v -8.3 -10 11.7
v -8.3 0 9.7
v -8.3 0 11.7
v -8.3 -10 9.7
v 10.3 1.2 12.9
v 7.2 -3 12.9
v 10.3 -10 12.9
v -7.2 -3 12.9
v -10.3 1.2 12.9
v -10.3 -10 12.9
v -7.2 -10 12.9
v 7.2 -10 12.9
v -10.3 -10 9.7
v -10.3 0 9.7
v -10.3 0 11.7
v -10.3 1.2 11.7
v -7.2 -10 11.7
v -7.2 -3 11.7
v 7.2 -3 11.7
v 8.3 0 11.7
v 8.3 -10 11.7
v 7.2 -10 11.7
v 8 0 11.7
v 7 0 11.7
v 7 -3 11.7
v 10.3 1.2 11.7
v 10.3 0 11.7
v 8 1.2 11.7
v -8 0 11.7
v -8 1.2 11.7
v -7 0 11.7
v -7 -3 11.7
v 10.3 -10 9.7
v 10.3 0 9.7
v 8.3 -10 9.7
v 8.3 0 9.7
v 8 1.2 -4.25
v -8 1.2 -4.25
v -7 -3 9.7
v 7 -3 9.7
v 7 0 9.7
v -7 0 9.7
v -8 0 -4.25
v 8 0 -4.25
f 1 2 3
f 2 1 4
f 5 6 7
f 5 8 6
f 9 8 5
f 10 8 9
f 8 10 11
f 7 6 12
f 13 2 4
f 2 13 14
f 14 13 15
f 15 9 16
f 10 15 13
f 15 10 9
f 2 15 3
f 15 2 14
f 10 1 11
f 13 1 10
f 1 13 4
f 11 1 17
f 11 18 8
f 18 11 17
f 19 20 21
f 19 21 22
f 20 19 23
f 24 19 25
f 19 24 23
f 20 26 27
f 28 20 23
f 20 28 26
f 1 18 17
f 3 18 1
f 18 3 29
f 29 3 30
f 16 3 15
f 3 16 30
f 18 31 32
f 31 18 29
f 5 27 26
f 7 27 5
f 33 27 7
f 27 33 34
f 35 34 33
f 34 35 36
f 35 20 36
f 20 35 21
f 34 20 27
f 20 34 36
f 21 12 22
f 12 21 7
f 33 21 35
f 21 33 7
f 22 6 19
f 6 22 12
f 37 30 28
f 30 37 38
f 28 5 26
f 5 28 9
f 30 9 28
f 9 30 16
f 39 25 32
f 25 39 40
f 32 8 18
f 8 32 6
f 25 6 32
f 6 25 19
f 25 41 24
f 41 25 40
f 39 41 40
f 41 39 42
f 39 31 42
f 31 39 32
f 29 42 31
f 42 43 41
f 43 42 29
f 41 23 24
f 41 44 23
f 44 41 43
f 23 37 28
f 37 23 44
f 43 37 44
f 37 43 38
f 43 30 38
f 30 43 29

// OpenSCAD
// ReachSense six-finger wrap v2. Units: mm. Experimental, physically unverified.
// R: +X lateral, +Y distal (towards fingertip), +Z dorsal.
// A REMOVABLE seating gauge defines Y=0. The wearable deck ends at Y=-3.
// Remove the gauge before testing; no permanent wall blocks the fingertip.
// This defines nominal longitudinal registration, NOT an anatomical 3D point.
$fn = 48;
part = "gauge"; // "holder", "gauge" or "strap"
marker_id = 32;
finger_diameter_mm = 17;
marker_edge_mm = 10;
quiet_zone_mm = 2;
frame_mm = 1;
wall_mm = 2;
stop_wall_mm = 1.2;
strap_width_mm = 6;
strap_length_mm = 90;
gauge_side_clearance_mm = 0.3;
r = finger_diameter_mm/2;
tile = marker_edge_mm + 2*quiet_zone_mm;
deck_width = tile + 2*frame_mm;
length = tile + 2*frame_mm + 8;
deck_front_y = -3;
deck_back_y = deck_front_y-length;
deck_bottom = r + wall_mm - 0.8;
deck_top = deck_bottom + 2;
pocket_depth = 0.2;
marker_y = deck_front_y-(frame_mm+quiet_zone_mm+marker_edge_mm/2);
support_y = [deck_front_y-5,deck_back_y+5];
nail_seat_width = min(8,finger_diameter_mm/2);
nail_seat_z = r-0.6;
assert(finger_diameter_mm >= 12 && finger_diameter_mm <= 26,"Choose a 12–26 mm candidate opening");
assert(marker_edge_mm >= 8 && marker_edge_mm <= 16,"Choose an 8–16 mm black edge");
assert(quiet_zone_mm >= 2,"Keep the full white quiet zone");
assert(marker_id >= 0 && marker_id < 100,"DICT_4X4_100 ID required");
module support(y) {
    translate([0,y,0]) intersection() {
        difference() {
            rotate([90,0,0]) cylinder(r=r+wall_mm,h=6.8,center=true);
            rotate([90,0,0]) cylinder(r=r,h=8.8,center=true);
        }
        translate([-r-wall_mm-1,-4.4,0]) cube([2*(r+wall_mm+1),8.8,r+wall_mm+1]);
    }
    // Flat dorsal bearing at each strap region closes the gap below the deck.
    // Contact with a real nail/dorsal surface and rotational retention are unverified.
    translate([-nail_seat_width/2,y-1.5,nail_seat_z])
        cube([nail_seat_width,3,deck_bottom-nail_seat_z+0.2]);
    for(sign=[-1,1]) translate([sign*(r+wall_mm+2.1),y,1.5]) difference() {
        cube([6,8.8,3],center=true);
        cube([2.6,6.4,5],center=true);
    }
}
module deck() {
    // Rounded corners retain a straight central gauge abutment at Y=-3.
    hull() for(x=[-deck_width/2+1,deck_width/2-1])
        for(y=[deck_back_y+1,deck_front_y-1])
            translate([x,y,deck_bottom]) cylinder(r=1,h=2);
}
module holder() {
    difference() {
        union() { for(y=support_y) support(y); deck(); }
        translate([-tile/2-0.1,marker_y-tile/2-0.1,deck_top-pocket_depth])
            cube([tile+0.2,tile+0.2,pocket_depth+1]);
    }
}
module gauge() {
    // Hand-held drop-on gauge, NOT a validated snap fit. Hold its proximal
    // abutment against the deck's front face at Y=-3 while gently seating the finger.
    // Feet sit on the bare side frame; the ArUco pocket remains clear.
    union() {
        translate([-deck_width/2-2.3,deck_front_y,deck_top])
            cube([deck_width+4.6,-deck_front_y+stop_wall_mm,1.2]);
        // Deck contact Y=-3; fingertip contact Y=0. Remove upwards after tightening.
        translate([-deck_width/2+1,deck_front_y,deck_bottom])
            cube([deck_width-2,-deck_front_y,deck_top-deck_bottom+0.5]);
        translate([-deck_width/2,0,-r/2])
            cube([deck_width,stop_wall_mm,deck_top+1.2+r/2]);
        for(sign=[-1,1]) {
            x=sign>0 ? deck_width/2+gauge_side_clearance_mm : -deck_width/2-gauge_side_clearance_mm-2;
            translate([x,-10,deck_bottom]) cube([2,10,deck_top-deck_bottom+1.2]);
            foot_x=sign>0 ? deck_width/2-0.8 : -deck_width/2-2.3;
            translate([foot_x,-10,deck_top]) cube([3.1,10,1.2]);
        }
    }
}
module strap() {
    // TPU-only ladder strip. Ends require a return loop/fastener or hook-and-loop.
    union() {
        translate([-strap_length_mm/2,-strap_width_mm/2,0]) cube([strap_length_mm,strap_width_mm,0.8]);
        for(x=[-strap_length_mm/2+3:4:strap_length_mm/2-3])
            translate([x-0.7,-strap_width_mm/2,0.8]) cube([1.4,strap_width_mm,0.5]);
    }
}
if(part=="strap") strap(); else if(part=="gauge") gauge(); else holder();
echo(reference_plane_y_mm=0,deck_front_y_mm=deck_front_y);
echo(marker_center_R_mm=[0,marker_y,deck_top-pocket_depth+0.15]);
echo(marker_center_to_reference_plane_mm=-marker_y);
